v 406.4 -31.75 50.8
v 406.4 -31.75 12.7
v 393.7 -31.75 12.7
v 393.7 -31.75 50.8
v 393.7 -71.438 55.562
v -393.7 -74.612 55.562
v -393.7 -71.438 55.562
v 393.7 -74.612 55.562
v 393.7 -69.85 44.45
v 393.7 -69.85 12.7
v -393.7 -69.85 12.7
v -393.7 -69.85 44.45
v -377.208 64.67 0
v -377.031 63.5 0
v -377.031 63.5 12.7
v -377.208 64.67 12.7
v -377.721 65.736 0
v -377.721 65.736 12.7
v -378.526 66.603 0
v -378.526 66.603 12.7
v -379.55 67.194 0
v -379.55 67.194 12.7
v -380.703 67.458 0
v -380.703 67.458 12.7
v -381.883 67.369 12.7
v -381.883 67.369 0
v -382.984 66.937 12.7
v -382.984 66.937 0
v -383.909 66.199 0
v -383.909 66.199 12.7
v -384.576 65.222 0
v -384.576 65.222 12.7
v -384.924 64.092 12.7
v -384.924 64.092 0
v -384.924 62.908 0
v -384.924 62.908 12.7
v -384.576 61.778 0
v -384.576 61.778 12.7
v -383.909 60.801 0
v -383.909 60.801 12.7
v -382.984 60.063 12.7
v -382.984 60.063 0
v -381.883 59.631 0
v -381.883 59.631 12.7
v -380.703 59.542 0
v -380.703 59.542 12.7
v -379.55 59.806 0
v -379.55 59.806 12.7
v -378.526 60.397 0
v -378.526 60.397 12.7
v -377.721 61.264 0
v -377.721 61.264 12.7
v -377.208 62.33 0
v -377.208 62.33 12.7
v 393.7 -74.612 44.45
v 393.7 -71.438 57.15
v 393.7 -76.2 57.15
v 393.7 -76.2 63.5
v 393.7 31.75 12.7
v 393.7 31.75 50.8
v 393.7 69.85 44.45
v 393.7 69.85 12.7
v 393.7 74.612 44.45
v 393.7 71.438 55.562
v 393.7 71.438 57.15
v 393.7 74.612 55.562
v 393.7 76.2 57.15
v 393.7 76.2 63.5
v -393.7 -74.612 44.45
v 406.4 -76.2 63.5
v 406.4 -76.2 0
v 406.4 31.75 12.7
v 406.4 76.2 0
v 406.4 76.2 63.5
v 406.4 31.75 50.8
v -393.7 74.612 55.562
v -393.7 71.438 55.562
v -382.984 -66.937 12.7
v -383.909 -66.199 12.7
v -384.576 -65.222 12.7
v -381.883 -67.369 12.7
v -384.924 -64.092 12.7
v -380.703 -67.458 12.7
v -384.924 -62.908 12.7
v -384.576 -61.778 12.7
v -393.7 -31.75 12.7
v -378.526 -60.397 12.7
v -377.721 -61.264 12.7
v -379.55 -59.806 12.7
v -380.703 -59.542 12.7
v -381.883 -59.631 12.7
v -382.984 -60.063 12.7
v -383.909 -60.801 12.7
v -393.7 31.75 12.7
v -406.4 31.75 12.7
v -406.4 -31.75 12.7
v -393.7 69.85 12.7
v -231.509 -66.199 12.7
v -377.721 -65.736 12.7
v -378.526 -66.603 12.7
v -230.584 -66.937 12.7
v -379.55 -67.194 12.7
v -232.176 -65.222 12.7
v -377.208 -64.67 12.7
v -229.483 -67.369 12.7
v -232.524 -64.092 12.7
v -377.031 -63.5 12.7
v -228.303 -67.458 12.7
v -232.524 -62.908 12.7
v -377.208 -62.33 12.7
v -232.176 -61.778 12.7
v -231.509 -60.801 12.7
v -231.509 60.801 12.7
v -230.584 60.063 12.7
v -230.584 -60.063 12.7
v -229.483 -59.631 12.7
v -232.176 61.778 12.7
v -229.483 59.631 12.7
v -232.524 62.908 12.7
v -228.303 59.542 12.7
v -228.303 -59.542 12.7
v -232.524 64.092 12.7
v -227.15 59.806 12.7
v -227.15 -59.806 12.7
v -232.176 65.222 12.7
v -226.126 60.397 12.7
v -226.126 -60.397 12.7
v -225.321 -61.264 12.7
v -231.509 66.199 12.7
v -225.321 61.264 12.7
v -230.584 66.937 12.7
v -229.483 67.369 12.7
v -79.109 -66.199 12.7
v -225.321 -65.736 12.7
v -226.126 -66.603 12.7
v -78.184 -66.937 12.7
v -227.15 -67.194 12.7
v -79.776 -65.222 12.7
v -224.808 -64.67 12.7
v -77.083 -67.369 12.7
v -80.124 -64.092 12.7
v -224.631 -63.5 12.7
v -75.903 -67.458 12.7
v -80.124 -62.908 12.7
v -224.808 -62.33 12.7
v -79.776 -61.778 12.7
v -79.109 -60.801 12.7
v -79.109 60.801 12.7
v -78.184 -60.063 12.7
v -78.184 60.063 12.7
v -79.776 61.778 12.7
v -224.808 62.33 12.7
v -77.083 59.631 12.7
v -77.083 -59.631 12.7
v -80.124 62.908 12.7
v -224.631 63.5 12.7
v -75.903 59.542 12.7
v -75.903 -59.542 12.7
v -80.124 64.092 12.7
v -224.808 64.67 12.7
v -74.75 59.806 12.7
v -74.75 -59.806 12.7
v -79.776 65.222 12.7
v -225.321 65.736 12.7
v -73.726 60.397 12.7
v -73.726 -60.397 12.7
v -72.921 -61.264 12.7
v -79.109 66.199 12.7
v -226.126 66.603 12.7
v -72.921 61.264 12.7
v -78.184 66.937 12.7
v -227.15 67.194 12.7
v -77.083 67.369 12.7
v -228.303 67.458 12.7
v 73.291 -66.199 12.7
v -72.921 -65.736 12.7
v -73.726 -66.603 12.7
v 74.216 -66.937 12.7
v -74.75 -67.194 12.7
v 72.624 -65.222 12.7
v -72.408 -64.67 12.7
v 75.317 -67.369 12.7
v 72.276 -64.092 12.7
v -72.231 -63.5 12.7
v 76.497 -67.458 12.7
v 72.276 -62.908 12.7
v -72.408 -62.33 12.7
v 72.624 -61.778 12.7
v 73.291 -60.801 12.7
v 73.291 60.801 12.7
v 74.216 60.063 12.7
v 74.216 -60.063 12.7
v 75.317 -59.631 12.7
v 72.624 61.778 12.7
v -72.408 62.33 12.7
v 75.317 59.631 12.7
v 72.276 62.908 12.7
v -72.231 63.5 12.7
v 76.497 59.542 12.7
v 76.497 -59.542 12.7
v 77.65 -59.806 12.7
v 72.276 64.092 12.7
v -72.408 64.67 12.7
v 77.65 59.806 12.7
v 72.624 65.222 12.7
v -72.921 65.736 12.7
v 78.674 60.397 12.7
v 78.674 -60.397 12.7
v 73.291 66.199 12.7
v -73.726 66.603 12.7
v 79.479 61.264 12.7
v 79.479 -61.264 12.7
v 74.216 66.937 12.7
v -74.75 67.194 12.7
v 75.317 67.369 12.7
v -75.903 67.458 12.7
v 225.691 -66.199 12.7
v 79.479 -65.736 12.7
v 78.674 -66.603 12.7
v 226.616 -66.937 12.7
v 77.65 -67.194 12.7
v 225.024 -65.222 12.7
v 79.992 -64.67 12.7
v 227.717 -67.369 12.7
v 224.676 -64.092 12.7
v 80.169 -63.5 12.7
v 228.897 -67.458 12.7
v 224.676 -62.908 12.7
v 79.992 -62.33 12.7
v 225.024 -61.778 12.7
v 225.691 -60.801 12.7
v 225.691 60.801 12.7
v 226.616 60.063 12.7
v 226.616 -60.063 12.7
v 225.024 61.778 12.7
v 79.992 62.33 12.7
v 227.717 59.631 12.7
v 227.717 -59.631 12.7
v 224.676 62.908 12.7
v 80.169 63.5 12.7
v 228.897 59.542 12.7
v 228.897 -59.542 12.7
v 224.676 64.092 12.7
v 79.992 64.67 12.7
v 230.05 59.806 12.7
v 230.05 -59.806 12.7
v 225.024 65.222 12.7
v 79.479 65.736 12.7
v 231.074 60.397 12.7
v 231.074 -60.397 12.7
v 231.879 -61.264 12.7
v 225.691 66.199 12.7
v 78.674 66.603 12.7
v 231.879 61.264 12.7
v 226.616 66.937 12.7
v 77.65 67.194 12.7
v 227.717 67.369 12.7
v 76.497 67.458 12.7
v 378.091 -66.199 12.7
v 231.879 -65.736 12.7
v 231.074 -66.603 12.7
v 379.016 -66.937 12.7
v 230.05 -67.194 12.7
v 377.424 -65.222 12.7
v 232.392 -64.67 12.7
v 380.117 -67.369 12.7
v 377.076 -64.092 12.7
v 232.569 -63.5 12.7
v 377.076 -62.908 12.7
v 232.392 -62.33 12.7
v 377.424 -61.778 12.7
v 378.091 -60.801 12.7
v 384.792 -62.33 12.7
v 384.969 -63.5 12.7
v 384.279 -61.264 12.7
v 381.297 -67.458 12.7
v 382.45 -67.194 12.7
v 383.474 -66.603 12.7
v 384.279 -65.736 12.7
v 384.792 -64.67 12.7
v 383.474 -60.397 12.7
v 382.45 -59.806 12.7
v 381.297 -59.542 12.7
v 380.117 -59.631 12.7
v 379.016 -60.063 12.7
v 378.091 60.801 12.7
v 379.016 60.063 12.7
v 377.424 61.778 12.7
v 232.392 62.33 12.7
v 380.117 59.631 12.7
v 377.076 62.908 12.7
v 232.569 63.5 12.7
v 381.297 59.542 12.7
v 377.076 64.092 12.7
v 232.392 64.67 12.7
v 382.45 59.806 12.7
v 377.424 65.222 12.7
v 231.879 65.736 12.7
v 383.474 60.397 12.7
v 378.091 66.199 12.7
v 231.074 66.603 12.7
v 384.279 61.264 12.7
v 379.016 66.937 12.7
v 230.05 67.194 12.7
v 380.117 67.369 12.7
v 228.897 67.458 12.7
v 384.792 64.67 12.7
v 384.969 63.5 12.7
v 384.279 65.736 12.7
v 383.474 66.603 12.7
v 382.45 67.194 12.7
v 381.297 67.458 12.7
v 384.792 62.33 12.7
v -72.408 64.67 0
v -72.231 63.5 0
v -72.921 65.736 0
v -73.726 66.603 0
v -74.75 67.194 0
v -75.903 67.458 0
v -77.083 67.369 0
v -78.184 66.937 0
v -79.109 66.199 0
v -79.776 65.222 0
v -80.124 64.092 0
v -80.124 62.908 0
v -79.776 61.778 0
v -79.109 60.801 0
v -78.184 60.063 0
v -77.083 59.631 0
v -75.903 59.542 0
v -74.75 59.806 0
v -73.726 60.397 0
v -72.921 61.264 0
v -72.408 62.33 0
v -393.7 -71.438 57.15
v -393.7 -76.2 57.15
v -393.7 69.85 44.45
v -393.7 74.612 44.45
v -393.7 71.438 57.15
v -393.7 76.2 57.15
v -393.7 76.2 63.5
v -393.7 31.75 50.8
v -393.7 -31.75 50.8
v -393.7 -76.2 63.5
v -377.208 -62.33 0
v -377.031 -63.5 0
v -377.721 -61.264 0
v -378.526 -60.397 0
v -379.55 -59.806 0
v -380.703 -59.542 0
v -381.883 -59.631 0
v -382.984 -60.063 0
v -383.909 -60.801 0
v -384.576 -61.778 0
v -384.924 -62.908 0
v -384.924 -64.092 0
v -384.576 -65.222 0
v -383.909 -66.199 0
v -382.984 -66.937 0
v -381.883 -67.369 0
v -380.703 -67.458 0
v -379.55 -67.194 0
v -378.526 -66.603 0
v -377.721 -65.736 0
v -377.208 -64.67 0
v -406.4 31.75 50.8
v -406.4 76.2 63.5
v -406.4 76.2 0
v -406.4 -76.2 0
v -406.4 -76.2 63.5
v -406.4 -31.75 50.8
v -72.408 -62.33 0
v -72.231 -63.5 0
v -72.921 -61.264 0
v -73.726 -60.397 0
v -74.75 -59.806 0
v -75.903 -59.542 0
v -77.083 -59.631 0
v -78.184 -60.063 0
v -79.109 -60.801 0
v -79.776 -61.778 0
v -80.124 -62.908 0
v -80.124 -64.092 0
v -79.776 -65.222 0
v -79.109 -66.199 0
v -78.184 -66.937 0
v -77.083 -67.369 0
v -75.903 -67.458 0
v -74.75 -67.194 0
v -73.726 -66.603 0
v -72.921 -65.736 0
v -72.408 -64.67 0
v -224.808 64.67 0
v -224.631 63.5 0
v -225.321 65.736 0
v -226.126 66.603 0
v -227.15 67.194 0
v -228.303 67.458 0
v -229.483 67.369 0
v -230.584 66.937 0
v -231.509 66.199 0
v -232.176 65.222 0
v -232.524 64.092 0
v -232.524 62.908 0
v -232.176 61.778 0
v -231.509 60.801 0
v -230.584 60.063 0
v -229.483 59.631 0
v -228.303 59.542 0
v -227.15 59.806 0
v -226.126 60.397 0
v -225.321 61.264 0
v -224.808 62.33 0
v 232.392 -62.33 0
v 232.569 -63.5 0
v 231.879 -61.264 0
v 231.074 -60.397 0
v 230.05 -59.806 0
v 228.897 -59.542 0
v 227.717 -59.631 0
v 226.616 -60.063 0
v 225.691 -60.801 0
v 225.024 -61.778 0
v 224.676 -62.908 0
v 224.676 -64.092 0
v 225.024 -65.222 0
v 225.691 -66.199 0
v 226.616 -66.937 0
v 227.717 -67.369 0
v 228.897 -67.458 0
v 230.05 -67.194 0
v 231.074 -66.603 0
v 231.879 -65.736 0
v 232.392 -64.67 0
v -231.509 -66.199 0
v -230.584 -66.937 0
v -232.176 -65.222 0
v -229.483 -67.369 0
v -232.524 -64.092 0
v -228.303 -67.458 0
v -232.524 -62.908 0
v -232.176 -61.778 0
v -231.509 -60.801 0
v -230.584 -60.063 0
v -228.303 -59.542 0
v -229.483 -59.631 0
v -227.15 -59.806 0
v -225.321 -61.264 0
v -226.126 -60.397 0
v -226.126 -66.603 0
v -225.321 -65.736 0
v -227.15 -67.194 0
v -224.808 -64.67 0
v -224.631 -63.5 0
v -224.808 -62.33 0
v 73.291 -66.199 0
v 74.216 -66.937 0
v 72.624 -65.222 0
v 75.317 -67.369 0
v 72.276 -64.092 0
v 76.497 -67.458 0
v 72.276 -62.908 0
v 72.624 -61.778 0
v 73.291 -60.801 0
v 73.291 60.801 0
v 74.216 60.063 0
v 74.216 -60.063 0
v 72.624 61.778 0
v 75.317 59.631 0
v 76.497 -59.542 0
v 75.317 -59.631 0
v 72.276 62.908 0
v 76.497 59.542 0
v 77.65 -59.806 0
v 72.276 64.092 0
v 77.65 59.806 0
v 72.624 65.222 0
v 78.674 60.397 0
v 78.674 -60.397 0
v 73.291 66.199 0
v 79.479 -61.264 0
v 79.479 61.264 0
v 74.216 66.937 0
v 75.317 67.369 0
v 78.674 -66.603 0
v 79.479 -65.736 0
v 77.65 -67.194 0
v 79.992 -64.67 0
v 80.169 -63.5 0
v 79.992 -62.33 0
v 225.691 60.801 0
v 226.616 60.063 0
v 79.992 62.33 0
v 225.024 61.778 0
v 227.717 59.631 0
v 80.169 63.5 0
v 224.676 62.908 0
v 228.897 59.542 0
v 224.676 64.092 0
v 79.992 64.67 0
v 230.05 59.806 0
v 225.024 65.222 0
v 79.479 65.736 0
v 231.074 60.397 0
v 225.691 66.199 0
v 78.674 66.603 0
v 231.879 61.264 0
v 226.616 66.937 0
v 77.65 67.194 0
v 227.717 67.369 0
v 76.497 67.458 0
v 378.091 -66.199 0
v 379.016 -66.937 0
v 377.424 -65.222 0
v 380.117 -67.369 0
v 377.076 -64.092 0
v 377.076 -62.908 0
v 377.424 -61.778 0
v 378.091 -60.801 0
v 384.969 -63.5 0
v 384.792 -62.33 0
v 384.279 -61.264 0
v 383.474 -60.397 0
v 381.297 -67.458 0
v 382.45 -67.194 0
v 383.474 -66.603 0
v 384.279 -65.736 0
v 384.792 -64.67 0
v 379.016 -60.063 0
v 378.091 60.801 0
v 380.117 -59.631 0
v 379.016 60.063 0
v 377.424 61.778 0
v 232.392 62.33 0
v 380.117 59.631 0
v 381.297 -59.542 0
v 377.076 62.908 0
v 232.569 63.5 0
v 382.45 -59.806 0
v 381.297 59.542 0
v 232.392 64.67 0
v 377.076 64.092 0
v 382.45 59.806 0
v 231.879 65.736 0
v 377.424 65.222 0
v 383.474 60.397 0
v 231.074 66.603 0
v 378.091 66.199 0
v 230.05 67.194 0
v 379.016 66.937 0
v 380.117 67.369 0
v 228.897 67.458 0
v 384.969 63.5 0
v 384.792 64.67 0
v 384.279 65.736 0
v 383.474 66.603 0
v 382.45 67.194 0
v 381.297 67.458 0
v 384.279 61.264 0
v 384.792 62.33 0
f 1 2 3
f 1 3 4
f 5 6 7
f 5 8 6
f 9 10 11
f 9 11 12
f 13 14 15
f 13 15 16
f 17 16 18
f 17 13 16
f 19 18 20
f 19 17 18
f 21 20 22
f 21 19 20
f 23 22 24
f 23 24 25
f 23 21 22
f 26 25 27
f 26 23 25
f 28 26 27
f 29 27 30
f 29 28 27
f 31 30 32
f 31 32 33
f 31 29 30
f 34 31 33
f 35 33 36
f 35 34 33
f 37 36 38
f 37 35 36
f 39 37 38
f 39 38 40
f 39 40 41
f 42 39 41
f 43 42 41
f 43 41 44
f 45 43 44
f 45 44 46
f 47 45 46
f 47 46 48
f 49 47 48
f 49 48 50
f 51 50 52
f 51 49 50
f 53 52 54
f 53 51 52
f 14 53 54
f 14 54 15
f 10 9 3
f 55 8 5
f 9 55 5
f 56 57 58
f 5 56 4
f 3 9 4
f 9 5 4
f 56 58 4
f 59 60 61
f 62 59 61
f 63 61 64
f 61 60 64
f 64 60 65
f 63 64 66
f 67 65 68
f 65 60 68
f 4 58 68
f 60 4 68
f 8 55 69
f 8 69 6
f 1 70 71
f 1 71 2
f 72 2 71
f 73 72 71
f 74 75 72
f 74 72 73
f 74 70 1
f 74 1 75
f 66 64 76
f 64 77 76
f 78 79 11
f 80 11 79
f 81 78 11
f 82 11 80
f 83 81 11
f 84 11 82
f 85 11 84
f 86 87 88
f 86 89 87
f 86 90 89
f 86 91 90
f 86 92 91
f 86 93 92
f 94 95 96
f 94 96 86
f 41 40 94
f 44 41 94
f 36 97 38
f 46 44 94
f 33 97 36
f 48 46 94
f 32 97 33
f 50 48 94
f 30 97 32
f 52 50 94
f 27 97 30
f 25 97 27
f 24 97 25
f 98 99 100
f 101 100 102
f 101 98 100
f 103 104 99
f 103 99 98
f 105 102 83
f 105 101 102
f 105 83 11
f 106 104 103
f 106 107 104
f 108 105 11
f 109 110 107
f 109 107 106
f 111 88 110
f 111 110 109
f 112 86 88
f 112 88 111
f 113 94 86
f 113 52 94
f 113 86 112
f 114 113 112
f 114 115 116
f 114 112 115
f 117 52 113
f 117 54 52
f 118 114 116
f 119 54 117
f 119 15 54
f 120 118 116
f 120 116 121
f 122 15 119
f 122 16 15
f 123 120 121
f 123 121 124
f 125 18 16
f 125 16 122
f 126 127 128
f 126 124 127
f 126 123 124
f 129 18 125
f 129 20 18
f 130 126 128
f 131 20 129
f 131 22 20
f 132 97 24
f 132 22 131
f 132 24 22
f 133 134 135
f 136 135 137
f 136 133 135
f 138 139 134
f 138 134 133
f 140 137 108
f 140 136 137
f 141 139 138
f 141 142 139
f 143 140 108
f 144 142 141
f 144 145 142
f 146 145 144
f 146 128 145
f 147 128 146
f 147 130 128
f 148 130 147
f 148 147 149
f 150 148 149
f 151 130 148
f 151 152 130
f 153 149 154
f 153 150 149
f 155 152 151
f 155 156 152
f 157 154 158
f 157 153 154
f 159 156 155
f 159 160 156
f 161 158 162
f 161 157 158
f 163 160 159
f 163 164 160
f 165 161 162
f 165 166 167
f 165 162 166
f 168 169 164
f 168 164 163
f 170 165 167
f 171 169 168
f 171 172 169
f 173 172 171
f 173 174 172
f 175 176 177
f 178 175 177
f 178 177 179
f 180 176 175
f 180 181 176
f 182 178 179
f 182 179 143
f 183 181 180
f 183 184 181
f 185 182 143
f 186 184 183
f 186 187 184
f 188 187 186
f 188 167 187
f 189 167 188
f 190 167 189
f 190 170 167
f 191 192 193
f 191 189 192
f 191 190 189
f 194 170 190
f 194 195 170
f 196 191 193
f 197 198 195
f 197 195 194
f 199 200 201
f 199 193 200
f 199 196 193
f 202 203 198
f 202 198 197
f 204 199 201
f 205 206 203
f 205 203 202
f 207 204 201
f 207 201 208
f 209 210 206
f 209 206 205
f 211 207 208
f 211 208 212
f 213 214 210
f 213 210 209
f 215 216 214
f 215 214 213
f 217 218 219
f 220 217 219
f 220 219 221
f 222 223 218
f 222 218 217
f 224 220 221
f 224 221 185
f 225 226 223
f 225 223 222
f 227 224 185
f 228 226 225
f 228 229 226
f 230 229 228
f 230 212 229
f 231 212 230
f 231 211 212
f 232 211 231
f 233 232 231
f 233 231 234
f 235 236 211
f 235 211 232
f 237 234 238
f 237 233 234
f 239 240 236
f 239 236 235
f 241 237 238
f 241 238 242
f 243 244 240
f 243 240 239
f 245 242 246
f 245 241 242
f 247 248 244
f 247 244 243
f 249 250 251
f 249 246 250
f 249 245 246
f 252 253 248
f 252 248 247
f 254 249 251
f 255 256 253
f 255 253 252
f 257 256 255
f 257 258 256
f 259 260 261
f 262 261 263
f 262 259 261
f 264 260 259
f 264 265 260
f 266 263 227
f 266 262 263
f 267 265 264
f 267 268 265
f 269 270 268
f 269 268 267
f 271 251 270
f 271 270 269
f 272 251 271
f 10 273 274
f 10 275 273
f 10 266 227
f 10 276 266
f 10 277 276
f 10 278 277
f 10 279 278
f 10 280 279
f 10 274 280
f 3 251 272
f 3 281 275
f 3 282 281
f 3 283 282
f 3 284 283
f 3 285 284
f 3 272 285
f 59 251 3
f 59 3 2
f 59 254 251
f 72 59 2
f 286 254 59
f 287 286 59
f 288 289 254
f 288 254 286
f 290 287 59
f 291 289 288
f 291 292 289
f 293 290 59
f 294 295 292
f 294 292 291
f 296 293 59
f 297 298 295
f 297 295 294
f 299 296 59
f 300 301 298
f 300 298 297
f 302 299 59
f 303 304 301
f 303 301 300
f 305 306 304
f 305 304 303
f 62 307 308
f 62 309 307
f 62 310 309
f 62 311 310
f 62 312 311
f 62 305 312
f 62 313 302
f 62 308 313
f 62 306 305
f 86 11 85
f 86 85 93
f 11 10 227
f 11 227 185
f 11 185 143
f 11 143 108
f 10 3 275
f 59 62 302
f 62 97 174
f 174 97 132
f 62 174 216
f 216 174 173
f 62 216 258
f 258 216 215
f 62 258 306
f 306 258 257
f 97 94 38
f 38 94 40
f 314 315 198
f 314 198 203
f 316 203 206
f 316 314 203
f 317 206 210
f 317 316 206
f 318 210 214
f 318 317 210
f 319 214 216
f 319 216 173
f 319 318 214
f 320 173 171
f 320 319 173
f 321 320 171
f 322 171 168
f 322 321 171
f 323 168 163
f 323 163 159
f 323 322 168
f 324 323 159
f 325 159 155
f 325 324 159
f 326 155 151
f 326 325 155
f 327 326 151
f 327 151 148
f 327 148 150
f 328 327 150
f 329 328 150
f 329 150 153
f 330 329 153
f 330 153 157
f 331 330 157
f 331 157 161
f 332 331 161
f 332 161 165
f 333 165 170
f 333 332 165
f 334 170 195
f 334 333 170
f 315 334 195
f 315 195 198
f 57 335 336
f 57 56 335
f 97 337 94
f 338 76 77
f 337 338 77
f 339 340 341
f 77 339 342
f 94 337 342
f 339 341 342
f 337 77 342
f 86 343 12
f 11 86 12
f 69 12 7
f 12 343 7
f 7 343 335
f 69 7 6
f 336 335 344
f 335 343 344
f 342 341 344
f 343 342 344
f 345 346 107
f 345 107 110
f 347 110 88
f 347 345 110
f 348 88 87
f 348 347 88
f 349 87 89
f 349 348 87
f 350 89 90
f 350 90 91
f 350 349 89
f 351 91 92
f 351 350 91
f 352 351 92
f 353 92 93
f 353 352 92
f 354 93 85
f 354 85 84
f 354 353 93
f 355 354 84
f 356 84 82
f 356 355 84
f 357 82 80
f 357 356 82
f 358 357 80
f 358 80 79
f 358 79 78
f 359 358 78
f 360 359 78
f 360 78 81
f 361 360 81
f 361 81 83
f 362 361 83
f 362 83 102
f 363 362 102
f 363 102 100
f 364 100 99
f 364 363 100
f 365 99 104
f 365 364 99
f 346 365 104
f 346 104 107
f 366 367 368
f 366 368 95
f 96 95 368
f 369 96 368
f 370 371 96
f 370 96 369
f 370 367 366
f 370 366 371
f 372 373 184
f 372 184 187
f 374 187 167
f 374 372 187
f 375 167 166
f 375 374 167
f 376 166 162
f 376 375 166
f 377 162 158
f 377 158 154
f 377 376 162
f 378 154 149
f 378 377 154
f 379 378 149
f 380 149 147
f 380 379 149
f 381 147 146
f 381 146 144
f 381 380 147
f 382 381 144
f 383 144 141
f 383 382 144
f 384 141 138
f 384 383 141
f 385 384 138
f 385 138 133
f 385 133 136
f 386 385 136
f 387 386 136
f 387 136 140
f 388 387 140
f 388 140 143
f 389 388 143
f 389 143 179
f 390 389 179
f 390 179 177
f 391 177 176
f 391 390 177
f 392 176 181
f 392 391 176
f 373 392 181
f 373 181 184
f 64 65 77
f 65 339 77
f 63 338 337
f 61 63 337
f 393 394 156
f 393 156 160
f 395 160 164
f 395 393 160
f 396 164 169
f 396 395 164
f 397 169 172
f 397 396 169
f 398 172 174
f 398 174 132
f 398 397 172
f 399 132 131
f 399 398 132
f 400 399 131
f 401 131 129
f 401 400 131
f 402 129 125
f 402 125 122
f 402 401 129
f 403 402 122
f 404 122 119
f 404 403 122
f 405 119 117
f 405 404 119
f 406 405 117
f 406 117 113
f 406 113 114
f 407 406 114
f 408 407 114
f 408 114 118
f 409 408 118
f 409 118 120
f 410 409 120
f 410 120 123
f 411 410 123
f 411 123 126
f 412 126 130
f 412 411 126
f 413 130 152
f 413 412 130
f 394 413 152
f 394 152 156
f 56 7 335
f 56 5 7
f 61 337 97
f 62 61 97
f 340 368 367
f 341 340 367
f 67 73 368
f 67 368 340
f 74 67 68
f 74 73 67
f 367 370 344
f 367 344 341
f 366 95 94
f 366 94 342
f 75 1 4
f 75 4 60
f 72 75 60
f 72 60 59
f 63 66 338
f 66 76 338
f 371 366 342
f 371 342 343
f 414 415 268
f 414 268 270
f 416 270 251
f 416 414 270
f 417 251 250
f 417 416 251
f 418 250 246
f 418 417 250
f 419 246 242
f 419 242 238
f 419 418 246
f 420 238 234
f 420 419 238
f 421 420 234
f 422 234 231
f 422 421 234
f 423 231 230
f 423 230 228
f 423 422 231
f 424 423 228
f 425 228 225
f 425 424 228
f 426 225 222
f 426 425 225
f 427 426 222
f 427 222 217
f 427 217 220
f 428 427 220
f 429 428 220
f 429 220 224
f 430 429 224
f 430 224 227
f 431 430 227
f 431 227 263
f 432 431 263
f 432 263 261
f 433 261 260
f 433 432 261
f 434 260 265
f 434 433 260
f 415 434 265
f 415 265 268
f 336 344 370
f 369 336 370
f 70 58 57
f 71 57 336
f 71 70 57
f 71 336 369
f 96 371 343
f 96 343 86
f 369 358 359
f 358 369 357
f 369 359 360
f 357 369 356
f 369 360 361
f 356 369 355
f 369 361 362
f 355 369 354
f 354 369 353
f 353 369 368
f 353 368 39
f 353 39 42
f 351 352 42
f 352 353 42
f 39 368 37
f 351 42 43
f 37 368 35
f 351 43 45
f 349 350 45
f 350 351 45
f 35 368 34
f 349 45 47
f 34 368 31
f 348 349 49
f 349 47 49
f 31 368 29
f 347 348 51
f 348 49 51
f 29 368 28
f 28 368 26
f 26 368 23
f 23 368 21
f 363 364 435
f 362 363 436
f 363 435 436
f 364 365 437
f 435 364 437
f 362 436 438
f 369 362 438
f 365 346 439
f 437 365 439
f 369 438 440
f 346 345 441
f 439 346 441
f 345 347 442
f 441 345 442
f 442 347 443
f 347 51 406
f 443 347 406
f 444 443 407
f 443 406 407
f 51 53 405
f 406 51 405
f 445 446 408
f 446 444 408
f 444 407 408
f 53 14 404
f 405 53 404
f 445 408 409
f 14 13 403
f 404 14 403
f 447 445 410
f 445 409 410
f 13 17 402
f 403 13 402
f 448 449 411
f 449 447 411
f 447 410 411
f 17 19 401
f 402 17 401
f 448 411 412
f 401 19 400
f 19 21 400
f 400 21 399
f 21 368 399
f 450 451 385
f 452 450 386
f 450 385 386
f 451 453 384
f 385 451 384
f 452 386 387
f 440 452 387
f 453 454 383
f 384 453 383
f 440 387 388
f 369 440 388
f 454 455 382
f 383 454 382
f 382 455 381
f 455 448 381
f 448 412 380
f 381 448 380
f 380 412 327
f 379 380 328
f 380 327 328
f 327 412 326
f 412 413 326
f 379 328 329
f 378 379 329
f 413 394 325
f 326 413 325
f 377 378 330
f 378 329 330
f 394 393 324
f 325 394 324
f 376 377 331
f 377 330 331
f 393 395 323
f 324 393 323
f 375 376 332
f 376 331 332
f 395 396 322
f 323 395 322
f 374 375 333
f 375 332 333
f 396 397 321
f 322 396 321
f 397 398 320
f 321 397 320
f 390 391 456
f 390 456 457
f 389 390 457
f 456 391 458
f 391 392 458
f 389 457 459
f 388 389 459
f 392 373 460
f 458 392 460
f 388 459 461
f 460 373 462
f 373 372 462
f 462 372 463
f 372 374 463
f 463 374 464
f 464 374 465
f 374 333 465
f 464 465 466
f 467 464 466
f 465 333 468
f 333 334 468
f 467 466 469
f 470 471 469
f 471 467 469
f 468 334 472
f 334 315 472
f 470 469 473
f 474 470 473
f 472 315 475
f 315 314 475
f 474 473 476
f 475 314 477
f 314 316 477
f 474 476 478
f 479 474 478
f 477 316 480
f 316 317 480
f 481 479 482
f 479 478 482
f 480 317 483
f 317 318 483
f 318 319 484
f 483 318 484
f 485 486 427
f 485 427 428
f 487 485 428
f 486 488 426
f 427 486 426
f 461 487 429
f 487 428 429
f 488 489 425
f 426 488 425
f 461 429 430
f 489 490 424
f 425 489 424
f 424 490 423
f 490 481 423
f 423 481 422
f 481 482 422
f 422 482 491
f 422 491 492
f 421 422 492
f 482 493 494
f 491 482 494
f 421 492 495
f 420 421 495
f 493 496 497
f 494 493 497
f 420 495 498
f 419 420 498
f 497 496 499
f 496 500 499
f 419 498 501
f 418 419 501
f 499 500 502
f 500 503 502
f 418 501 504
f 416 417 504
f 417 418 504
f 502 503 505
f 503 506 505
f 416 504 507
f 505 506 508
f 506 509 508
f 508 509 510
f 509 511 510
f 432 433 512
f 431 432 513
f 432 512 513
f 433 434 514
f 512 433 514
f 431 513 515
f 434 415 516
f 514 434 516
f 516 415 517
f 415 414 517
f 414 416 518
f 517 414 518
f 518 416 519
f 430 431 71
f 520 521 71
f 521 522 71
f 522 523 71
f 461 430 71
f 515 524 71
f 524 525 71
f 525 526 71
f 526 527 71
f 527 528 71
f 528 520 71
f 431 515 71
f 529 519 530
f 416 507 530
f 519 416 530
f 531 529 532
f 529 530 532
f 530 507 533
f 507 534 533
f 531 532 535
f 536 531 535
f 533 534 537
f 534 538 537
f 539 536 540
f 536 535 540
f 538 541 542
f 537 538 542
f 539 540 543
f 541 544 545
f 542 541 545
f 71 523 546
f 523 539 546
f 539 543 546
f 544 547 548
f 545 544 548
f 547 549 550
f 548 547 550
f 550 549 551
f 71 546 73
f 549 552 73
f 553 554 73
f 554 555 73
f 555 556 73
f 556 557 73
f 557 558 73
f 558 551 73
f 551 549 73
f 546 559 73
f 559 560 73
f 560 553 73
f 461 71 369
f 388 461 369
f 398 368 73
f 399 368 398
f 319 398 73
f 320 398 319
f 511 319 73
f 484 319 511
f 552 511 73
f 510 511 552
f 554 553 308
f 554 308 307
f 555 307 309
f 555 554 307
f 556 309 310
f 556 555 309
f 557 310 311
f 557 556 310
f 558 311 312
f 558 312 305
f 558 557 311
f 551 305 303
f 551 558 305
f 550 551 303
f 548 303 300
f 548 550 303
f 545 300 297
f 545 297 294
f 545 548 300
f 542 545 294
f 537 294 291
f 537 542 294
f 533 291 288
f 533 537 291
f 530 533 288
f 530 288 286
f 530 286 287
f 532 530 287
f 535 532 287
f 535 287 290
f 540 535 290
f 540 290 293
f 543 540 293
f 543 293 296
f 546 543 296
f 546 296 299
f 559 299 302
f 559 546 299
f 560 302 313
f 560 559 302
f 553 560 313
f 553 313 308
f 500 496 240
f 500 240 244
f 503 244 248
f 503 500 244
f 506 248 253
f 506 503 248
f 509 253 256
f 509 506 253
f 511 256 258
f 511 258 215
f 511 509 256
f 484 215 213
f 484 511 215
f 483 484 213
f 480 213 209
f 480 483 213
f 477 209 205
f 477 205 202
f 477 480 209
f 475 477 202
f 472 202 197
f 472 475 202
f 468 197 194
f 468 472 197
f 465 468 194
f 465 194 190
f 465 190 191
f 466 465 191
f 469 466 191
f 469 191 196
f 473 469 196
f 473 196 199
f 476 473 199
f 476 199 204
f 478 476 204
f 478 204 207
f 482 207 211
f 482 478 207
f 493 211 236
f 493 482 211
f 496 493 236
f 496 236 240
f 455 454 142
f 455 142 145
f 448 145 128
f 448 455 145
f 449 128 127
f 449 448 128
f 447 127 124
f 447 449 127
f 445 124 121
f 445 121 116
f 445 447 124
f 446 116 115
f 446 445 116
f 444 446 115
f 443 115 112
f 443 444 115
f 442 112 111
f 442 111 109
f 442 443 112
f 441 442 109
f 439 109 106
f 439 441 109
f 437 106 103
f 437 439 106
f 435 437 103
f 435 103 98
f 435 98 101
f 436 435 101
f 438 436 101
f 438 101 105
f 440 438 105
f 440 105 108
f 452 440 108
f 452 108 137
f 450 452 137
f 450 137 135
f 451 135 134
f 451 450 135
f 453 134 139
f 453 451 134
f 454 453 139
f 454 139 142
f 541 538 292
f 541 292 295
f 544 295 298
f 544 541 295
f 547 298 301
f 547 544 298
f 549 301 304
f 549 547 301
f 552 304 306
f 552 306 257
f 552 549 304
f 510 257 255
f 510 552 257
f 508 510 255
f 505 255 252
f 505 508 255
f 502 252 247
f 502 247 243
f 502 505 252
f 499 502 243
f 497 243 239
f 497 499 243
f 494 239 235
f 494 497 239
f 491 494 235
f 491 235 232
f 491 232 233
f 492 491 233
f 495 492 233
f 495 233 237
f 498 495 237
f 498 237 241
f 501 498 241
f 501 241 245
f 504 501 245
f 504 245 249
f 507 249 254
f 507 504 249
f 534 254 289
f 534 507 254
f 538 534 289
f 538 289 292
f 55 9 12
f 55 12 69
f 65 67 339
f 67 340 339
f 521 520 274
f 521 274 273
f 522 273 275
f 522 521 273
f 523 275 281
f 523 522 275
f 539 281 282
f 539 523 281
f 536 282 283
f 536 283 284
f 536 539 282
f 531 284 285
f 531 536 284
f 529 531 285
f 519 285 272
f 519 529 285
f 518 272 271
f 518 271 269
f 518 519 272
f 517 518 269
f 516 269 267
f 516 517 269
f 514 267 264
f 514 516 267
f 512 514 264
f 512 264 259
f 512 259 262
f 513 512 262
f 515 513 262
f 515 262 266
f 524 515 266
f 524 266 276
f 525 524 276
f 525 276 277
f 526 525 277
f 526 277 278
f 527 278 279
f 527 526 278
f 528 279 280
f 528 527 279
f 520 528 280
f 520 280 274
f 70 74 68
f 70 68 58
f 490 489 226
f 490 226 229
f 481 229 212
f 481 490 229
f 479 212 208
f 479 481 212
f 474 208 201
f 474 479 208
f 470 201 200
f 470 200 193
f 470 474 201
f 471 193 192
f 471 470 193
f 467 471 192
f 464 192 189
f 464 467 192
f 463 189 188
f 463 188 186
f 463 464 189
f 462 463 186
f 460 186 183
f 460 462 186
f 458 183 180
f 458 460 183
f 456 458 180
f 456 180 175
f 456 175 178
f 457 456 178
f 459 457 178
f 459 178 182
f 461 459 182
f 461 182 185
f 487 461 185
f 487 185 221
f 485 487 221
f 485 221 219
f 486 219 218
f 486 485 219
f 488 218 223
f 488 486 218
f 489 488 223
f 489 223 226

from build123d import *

# Parameters (mm, degrees)
F0_W     = 812.8
F0_H     = 152.4
F0_R     = 3.96875
F1_DEPTH = 12.7
F3_DEPTH = 12.7
F5_DEPTH = 12.7
F7_DEPTH = 393.7


with BuildPart() as f1:
    # F0 (on Top) → F1 (new body)
    with BuildSketch(Plane.XY):
        Rectangle(F0_W, F0_H)
        with Locations((-381, -63.5)):
            Circle(F0_R, mode=Mode.SUBTRACT)
        with Locations((-228.6, -63.5)):
            Circle(F0_R, mode=Mode.SUBTRACT)
        with Locations((-76.2, -63.5)):
            Circle(F0_R, mode=Mode.SUBTRACT)
        with Locations((76.2, -63.5)):
            Circle(F0_R, mode=Mode.SUBTRACT)
        with Locations((228.6, -63.5)):
            Circle(F0_R, mode=Mode.SUBTRACT)
        with Locations((381, -63.5)):
            Circle(F0_R, mode=Mode.SUBTRACT)
        with Locations((-381, 63.5)):
            Circle(F0_R, mode=Mode.SUBTRACT)
        with Locations((-228.6, 63.5)):
            Circle(F0_R, mode=Mode.SUBTRACT)
        with Locations((-76.2, 63.5)):
            Circle(F0_R, mode=Mode.SUBTRACT)
        with Locations((76.2, 63.5)):
            Circle(F0_R, mode=Mode.SUBTRACT)
        with Locations((228.6, 63.5)):
            Circle(F0_R, mode=Mode.SUBTRACT)
        with Locations((381, 63.5)):
            Circle(F0_R, mode=Mode.SUBTRACT)
    extrude(amount=F1_DEPTH)

    # F2 (on face) → F3 (join)
    with BuildSketch(Plane(origin=(-406.4, 0, 0), x_dir=(0, -1, 0), z_dir=(-1, 0, 0))):
        Polygon((76.2, 63.5), (-76.2, 63.5), (-76.2, 12.7), (-31.75, 12.7), (-31.75, 50.8), (31.75, 50.8), (31.75, 12.7), (76.2, 12.7), align=None)
    extrude(amount=-F3_DEPTH)

    # F4 (on face) → F5 (join)
    with BuildSketch(Plane.YZ.offset(406.4)):
        Polygon((-76.2, 63.5), (-76.2, 12.7), (-31.75, 12.7), (-31.75, 50.8), (31.75, 50.8), (31.75, 12.7), (76.2, 12.7), (76.2, 63.5), align=None)
    extrude(amount=-F5_DEPTH)

    # F6 (on Right) → F7 (join, symmetric)
    with BuildSketch(Plane.YZ):
        Polygon((69.85, 12.7), (76.2, 12.7), (76.2, 57.15), (71.4375, 57.15), (71.4375, 55.5625), (74.6125, 55.5625), (74.6125, 44.45), (69.85, 44.45), align=None)
        Polygon((-71.4375, 57.15), (-76.2, 57.15), (-76.2, 12.7), (-69.85, 12.7), (-69.85, 44.45), (-74.6125, 44.45), (-74.6125, 55.5625), (-71.4375, 55.5625), align=None)
    extrude(amount=F7_DEPTH, both=True)


solid = f1.part
